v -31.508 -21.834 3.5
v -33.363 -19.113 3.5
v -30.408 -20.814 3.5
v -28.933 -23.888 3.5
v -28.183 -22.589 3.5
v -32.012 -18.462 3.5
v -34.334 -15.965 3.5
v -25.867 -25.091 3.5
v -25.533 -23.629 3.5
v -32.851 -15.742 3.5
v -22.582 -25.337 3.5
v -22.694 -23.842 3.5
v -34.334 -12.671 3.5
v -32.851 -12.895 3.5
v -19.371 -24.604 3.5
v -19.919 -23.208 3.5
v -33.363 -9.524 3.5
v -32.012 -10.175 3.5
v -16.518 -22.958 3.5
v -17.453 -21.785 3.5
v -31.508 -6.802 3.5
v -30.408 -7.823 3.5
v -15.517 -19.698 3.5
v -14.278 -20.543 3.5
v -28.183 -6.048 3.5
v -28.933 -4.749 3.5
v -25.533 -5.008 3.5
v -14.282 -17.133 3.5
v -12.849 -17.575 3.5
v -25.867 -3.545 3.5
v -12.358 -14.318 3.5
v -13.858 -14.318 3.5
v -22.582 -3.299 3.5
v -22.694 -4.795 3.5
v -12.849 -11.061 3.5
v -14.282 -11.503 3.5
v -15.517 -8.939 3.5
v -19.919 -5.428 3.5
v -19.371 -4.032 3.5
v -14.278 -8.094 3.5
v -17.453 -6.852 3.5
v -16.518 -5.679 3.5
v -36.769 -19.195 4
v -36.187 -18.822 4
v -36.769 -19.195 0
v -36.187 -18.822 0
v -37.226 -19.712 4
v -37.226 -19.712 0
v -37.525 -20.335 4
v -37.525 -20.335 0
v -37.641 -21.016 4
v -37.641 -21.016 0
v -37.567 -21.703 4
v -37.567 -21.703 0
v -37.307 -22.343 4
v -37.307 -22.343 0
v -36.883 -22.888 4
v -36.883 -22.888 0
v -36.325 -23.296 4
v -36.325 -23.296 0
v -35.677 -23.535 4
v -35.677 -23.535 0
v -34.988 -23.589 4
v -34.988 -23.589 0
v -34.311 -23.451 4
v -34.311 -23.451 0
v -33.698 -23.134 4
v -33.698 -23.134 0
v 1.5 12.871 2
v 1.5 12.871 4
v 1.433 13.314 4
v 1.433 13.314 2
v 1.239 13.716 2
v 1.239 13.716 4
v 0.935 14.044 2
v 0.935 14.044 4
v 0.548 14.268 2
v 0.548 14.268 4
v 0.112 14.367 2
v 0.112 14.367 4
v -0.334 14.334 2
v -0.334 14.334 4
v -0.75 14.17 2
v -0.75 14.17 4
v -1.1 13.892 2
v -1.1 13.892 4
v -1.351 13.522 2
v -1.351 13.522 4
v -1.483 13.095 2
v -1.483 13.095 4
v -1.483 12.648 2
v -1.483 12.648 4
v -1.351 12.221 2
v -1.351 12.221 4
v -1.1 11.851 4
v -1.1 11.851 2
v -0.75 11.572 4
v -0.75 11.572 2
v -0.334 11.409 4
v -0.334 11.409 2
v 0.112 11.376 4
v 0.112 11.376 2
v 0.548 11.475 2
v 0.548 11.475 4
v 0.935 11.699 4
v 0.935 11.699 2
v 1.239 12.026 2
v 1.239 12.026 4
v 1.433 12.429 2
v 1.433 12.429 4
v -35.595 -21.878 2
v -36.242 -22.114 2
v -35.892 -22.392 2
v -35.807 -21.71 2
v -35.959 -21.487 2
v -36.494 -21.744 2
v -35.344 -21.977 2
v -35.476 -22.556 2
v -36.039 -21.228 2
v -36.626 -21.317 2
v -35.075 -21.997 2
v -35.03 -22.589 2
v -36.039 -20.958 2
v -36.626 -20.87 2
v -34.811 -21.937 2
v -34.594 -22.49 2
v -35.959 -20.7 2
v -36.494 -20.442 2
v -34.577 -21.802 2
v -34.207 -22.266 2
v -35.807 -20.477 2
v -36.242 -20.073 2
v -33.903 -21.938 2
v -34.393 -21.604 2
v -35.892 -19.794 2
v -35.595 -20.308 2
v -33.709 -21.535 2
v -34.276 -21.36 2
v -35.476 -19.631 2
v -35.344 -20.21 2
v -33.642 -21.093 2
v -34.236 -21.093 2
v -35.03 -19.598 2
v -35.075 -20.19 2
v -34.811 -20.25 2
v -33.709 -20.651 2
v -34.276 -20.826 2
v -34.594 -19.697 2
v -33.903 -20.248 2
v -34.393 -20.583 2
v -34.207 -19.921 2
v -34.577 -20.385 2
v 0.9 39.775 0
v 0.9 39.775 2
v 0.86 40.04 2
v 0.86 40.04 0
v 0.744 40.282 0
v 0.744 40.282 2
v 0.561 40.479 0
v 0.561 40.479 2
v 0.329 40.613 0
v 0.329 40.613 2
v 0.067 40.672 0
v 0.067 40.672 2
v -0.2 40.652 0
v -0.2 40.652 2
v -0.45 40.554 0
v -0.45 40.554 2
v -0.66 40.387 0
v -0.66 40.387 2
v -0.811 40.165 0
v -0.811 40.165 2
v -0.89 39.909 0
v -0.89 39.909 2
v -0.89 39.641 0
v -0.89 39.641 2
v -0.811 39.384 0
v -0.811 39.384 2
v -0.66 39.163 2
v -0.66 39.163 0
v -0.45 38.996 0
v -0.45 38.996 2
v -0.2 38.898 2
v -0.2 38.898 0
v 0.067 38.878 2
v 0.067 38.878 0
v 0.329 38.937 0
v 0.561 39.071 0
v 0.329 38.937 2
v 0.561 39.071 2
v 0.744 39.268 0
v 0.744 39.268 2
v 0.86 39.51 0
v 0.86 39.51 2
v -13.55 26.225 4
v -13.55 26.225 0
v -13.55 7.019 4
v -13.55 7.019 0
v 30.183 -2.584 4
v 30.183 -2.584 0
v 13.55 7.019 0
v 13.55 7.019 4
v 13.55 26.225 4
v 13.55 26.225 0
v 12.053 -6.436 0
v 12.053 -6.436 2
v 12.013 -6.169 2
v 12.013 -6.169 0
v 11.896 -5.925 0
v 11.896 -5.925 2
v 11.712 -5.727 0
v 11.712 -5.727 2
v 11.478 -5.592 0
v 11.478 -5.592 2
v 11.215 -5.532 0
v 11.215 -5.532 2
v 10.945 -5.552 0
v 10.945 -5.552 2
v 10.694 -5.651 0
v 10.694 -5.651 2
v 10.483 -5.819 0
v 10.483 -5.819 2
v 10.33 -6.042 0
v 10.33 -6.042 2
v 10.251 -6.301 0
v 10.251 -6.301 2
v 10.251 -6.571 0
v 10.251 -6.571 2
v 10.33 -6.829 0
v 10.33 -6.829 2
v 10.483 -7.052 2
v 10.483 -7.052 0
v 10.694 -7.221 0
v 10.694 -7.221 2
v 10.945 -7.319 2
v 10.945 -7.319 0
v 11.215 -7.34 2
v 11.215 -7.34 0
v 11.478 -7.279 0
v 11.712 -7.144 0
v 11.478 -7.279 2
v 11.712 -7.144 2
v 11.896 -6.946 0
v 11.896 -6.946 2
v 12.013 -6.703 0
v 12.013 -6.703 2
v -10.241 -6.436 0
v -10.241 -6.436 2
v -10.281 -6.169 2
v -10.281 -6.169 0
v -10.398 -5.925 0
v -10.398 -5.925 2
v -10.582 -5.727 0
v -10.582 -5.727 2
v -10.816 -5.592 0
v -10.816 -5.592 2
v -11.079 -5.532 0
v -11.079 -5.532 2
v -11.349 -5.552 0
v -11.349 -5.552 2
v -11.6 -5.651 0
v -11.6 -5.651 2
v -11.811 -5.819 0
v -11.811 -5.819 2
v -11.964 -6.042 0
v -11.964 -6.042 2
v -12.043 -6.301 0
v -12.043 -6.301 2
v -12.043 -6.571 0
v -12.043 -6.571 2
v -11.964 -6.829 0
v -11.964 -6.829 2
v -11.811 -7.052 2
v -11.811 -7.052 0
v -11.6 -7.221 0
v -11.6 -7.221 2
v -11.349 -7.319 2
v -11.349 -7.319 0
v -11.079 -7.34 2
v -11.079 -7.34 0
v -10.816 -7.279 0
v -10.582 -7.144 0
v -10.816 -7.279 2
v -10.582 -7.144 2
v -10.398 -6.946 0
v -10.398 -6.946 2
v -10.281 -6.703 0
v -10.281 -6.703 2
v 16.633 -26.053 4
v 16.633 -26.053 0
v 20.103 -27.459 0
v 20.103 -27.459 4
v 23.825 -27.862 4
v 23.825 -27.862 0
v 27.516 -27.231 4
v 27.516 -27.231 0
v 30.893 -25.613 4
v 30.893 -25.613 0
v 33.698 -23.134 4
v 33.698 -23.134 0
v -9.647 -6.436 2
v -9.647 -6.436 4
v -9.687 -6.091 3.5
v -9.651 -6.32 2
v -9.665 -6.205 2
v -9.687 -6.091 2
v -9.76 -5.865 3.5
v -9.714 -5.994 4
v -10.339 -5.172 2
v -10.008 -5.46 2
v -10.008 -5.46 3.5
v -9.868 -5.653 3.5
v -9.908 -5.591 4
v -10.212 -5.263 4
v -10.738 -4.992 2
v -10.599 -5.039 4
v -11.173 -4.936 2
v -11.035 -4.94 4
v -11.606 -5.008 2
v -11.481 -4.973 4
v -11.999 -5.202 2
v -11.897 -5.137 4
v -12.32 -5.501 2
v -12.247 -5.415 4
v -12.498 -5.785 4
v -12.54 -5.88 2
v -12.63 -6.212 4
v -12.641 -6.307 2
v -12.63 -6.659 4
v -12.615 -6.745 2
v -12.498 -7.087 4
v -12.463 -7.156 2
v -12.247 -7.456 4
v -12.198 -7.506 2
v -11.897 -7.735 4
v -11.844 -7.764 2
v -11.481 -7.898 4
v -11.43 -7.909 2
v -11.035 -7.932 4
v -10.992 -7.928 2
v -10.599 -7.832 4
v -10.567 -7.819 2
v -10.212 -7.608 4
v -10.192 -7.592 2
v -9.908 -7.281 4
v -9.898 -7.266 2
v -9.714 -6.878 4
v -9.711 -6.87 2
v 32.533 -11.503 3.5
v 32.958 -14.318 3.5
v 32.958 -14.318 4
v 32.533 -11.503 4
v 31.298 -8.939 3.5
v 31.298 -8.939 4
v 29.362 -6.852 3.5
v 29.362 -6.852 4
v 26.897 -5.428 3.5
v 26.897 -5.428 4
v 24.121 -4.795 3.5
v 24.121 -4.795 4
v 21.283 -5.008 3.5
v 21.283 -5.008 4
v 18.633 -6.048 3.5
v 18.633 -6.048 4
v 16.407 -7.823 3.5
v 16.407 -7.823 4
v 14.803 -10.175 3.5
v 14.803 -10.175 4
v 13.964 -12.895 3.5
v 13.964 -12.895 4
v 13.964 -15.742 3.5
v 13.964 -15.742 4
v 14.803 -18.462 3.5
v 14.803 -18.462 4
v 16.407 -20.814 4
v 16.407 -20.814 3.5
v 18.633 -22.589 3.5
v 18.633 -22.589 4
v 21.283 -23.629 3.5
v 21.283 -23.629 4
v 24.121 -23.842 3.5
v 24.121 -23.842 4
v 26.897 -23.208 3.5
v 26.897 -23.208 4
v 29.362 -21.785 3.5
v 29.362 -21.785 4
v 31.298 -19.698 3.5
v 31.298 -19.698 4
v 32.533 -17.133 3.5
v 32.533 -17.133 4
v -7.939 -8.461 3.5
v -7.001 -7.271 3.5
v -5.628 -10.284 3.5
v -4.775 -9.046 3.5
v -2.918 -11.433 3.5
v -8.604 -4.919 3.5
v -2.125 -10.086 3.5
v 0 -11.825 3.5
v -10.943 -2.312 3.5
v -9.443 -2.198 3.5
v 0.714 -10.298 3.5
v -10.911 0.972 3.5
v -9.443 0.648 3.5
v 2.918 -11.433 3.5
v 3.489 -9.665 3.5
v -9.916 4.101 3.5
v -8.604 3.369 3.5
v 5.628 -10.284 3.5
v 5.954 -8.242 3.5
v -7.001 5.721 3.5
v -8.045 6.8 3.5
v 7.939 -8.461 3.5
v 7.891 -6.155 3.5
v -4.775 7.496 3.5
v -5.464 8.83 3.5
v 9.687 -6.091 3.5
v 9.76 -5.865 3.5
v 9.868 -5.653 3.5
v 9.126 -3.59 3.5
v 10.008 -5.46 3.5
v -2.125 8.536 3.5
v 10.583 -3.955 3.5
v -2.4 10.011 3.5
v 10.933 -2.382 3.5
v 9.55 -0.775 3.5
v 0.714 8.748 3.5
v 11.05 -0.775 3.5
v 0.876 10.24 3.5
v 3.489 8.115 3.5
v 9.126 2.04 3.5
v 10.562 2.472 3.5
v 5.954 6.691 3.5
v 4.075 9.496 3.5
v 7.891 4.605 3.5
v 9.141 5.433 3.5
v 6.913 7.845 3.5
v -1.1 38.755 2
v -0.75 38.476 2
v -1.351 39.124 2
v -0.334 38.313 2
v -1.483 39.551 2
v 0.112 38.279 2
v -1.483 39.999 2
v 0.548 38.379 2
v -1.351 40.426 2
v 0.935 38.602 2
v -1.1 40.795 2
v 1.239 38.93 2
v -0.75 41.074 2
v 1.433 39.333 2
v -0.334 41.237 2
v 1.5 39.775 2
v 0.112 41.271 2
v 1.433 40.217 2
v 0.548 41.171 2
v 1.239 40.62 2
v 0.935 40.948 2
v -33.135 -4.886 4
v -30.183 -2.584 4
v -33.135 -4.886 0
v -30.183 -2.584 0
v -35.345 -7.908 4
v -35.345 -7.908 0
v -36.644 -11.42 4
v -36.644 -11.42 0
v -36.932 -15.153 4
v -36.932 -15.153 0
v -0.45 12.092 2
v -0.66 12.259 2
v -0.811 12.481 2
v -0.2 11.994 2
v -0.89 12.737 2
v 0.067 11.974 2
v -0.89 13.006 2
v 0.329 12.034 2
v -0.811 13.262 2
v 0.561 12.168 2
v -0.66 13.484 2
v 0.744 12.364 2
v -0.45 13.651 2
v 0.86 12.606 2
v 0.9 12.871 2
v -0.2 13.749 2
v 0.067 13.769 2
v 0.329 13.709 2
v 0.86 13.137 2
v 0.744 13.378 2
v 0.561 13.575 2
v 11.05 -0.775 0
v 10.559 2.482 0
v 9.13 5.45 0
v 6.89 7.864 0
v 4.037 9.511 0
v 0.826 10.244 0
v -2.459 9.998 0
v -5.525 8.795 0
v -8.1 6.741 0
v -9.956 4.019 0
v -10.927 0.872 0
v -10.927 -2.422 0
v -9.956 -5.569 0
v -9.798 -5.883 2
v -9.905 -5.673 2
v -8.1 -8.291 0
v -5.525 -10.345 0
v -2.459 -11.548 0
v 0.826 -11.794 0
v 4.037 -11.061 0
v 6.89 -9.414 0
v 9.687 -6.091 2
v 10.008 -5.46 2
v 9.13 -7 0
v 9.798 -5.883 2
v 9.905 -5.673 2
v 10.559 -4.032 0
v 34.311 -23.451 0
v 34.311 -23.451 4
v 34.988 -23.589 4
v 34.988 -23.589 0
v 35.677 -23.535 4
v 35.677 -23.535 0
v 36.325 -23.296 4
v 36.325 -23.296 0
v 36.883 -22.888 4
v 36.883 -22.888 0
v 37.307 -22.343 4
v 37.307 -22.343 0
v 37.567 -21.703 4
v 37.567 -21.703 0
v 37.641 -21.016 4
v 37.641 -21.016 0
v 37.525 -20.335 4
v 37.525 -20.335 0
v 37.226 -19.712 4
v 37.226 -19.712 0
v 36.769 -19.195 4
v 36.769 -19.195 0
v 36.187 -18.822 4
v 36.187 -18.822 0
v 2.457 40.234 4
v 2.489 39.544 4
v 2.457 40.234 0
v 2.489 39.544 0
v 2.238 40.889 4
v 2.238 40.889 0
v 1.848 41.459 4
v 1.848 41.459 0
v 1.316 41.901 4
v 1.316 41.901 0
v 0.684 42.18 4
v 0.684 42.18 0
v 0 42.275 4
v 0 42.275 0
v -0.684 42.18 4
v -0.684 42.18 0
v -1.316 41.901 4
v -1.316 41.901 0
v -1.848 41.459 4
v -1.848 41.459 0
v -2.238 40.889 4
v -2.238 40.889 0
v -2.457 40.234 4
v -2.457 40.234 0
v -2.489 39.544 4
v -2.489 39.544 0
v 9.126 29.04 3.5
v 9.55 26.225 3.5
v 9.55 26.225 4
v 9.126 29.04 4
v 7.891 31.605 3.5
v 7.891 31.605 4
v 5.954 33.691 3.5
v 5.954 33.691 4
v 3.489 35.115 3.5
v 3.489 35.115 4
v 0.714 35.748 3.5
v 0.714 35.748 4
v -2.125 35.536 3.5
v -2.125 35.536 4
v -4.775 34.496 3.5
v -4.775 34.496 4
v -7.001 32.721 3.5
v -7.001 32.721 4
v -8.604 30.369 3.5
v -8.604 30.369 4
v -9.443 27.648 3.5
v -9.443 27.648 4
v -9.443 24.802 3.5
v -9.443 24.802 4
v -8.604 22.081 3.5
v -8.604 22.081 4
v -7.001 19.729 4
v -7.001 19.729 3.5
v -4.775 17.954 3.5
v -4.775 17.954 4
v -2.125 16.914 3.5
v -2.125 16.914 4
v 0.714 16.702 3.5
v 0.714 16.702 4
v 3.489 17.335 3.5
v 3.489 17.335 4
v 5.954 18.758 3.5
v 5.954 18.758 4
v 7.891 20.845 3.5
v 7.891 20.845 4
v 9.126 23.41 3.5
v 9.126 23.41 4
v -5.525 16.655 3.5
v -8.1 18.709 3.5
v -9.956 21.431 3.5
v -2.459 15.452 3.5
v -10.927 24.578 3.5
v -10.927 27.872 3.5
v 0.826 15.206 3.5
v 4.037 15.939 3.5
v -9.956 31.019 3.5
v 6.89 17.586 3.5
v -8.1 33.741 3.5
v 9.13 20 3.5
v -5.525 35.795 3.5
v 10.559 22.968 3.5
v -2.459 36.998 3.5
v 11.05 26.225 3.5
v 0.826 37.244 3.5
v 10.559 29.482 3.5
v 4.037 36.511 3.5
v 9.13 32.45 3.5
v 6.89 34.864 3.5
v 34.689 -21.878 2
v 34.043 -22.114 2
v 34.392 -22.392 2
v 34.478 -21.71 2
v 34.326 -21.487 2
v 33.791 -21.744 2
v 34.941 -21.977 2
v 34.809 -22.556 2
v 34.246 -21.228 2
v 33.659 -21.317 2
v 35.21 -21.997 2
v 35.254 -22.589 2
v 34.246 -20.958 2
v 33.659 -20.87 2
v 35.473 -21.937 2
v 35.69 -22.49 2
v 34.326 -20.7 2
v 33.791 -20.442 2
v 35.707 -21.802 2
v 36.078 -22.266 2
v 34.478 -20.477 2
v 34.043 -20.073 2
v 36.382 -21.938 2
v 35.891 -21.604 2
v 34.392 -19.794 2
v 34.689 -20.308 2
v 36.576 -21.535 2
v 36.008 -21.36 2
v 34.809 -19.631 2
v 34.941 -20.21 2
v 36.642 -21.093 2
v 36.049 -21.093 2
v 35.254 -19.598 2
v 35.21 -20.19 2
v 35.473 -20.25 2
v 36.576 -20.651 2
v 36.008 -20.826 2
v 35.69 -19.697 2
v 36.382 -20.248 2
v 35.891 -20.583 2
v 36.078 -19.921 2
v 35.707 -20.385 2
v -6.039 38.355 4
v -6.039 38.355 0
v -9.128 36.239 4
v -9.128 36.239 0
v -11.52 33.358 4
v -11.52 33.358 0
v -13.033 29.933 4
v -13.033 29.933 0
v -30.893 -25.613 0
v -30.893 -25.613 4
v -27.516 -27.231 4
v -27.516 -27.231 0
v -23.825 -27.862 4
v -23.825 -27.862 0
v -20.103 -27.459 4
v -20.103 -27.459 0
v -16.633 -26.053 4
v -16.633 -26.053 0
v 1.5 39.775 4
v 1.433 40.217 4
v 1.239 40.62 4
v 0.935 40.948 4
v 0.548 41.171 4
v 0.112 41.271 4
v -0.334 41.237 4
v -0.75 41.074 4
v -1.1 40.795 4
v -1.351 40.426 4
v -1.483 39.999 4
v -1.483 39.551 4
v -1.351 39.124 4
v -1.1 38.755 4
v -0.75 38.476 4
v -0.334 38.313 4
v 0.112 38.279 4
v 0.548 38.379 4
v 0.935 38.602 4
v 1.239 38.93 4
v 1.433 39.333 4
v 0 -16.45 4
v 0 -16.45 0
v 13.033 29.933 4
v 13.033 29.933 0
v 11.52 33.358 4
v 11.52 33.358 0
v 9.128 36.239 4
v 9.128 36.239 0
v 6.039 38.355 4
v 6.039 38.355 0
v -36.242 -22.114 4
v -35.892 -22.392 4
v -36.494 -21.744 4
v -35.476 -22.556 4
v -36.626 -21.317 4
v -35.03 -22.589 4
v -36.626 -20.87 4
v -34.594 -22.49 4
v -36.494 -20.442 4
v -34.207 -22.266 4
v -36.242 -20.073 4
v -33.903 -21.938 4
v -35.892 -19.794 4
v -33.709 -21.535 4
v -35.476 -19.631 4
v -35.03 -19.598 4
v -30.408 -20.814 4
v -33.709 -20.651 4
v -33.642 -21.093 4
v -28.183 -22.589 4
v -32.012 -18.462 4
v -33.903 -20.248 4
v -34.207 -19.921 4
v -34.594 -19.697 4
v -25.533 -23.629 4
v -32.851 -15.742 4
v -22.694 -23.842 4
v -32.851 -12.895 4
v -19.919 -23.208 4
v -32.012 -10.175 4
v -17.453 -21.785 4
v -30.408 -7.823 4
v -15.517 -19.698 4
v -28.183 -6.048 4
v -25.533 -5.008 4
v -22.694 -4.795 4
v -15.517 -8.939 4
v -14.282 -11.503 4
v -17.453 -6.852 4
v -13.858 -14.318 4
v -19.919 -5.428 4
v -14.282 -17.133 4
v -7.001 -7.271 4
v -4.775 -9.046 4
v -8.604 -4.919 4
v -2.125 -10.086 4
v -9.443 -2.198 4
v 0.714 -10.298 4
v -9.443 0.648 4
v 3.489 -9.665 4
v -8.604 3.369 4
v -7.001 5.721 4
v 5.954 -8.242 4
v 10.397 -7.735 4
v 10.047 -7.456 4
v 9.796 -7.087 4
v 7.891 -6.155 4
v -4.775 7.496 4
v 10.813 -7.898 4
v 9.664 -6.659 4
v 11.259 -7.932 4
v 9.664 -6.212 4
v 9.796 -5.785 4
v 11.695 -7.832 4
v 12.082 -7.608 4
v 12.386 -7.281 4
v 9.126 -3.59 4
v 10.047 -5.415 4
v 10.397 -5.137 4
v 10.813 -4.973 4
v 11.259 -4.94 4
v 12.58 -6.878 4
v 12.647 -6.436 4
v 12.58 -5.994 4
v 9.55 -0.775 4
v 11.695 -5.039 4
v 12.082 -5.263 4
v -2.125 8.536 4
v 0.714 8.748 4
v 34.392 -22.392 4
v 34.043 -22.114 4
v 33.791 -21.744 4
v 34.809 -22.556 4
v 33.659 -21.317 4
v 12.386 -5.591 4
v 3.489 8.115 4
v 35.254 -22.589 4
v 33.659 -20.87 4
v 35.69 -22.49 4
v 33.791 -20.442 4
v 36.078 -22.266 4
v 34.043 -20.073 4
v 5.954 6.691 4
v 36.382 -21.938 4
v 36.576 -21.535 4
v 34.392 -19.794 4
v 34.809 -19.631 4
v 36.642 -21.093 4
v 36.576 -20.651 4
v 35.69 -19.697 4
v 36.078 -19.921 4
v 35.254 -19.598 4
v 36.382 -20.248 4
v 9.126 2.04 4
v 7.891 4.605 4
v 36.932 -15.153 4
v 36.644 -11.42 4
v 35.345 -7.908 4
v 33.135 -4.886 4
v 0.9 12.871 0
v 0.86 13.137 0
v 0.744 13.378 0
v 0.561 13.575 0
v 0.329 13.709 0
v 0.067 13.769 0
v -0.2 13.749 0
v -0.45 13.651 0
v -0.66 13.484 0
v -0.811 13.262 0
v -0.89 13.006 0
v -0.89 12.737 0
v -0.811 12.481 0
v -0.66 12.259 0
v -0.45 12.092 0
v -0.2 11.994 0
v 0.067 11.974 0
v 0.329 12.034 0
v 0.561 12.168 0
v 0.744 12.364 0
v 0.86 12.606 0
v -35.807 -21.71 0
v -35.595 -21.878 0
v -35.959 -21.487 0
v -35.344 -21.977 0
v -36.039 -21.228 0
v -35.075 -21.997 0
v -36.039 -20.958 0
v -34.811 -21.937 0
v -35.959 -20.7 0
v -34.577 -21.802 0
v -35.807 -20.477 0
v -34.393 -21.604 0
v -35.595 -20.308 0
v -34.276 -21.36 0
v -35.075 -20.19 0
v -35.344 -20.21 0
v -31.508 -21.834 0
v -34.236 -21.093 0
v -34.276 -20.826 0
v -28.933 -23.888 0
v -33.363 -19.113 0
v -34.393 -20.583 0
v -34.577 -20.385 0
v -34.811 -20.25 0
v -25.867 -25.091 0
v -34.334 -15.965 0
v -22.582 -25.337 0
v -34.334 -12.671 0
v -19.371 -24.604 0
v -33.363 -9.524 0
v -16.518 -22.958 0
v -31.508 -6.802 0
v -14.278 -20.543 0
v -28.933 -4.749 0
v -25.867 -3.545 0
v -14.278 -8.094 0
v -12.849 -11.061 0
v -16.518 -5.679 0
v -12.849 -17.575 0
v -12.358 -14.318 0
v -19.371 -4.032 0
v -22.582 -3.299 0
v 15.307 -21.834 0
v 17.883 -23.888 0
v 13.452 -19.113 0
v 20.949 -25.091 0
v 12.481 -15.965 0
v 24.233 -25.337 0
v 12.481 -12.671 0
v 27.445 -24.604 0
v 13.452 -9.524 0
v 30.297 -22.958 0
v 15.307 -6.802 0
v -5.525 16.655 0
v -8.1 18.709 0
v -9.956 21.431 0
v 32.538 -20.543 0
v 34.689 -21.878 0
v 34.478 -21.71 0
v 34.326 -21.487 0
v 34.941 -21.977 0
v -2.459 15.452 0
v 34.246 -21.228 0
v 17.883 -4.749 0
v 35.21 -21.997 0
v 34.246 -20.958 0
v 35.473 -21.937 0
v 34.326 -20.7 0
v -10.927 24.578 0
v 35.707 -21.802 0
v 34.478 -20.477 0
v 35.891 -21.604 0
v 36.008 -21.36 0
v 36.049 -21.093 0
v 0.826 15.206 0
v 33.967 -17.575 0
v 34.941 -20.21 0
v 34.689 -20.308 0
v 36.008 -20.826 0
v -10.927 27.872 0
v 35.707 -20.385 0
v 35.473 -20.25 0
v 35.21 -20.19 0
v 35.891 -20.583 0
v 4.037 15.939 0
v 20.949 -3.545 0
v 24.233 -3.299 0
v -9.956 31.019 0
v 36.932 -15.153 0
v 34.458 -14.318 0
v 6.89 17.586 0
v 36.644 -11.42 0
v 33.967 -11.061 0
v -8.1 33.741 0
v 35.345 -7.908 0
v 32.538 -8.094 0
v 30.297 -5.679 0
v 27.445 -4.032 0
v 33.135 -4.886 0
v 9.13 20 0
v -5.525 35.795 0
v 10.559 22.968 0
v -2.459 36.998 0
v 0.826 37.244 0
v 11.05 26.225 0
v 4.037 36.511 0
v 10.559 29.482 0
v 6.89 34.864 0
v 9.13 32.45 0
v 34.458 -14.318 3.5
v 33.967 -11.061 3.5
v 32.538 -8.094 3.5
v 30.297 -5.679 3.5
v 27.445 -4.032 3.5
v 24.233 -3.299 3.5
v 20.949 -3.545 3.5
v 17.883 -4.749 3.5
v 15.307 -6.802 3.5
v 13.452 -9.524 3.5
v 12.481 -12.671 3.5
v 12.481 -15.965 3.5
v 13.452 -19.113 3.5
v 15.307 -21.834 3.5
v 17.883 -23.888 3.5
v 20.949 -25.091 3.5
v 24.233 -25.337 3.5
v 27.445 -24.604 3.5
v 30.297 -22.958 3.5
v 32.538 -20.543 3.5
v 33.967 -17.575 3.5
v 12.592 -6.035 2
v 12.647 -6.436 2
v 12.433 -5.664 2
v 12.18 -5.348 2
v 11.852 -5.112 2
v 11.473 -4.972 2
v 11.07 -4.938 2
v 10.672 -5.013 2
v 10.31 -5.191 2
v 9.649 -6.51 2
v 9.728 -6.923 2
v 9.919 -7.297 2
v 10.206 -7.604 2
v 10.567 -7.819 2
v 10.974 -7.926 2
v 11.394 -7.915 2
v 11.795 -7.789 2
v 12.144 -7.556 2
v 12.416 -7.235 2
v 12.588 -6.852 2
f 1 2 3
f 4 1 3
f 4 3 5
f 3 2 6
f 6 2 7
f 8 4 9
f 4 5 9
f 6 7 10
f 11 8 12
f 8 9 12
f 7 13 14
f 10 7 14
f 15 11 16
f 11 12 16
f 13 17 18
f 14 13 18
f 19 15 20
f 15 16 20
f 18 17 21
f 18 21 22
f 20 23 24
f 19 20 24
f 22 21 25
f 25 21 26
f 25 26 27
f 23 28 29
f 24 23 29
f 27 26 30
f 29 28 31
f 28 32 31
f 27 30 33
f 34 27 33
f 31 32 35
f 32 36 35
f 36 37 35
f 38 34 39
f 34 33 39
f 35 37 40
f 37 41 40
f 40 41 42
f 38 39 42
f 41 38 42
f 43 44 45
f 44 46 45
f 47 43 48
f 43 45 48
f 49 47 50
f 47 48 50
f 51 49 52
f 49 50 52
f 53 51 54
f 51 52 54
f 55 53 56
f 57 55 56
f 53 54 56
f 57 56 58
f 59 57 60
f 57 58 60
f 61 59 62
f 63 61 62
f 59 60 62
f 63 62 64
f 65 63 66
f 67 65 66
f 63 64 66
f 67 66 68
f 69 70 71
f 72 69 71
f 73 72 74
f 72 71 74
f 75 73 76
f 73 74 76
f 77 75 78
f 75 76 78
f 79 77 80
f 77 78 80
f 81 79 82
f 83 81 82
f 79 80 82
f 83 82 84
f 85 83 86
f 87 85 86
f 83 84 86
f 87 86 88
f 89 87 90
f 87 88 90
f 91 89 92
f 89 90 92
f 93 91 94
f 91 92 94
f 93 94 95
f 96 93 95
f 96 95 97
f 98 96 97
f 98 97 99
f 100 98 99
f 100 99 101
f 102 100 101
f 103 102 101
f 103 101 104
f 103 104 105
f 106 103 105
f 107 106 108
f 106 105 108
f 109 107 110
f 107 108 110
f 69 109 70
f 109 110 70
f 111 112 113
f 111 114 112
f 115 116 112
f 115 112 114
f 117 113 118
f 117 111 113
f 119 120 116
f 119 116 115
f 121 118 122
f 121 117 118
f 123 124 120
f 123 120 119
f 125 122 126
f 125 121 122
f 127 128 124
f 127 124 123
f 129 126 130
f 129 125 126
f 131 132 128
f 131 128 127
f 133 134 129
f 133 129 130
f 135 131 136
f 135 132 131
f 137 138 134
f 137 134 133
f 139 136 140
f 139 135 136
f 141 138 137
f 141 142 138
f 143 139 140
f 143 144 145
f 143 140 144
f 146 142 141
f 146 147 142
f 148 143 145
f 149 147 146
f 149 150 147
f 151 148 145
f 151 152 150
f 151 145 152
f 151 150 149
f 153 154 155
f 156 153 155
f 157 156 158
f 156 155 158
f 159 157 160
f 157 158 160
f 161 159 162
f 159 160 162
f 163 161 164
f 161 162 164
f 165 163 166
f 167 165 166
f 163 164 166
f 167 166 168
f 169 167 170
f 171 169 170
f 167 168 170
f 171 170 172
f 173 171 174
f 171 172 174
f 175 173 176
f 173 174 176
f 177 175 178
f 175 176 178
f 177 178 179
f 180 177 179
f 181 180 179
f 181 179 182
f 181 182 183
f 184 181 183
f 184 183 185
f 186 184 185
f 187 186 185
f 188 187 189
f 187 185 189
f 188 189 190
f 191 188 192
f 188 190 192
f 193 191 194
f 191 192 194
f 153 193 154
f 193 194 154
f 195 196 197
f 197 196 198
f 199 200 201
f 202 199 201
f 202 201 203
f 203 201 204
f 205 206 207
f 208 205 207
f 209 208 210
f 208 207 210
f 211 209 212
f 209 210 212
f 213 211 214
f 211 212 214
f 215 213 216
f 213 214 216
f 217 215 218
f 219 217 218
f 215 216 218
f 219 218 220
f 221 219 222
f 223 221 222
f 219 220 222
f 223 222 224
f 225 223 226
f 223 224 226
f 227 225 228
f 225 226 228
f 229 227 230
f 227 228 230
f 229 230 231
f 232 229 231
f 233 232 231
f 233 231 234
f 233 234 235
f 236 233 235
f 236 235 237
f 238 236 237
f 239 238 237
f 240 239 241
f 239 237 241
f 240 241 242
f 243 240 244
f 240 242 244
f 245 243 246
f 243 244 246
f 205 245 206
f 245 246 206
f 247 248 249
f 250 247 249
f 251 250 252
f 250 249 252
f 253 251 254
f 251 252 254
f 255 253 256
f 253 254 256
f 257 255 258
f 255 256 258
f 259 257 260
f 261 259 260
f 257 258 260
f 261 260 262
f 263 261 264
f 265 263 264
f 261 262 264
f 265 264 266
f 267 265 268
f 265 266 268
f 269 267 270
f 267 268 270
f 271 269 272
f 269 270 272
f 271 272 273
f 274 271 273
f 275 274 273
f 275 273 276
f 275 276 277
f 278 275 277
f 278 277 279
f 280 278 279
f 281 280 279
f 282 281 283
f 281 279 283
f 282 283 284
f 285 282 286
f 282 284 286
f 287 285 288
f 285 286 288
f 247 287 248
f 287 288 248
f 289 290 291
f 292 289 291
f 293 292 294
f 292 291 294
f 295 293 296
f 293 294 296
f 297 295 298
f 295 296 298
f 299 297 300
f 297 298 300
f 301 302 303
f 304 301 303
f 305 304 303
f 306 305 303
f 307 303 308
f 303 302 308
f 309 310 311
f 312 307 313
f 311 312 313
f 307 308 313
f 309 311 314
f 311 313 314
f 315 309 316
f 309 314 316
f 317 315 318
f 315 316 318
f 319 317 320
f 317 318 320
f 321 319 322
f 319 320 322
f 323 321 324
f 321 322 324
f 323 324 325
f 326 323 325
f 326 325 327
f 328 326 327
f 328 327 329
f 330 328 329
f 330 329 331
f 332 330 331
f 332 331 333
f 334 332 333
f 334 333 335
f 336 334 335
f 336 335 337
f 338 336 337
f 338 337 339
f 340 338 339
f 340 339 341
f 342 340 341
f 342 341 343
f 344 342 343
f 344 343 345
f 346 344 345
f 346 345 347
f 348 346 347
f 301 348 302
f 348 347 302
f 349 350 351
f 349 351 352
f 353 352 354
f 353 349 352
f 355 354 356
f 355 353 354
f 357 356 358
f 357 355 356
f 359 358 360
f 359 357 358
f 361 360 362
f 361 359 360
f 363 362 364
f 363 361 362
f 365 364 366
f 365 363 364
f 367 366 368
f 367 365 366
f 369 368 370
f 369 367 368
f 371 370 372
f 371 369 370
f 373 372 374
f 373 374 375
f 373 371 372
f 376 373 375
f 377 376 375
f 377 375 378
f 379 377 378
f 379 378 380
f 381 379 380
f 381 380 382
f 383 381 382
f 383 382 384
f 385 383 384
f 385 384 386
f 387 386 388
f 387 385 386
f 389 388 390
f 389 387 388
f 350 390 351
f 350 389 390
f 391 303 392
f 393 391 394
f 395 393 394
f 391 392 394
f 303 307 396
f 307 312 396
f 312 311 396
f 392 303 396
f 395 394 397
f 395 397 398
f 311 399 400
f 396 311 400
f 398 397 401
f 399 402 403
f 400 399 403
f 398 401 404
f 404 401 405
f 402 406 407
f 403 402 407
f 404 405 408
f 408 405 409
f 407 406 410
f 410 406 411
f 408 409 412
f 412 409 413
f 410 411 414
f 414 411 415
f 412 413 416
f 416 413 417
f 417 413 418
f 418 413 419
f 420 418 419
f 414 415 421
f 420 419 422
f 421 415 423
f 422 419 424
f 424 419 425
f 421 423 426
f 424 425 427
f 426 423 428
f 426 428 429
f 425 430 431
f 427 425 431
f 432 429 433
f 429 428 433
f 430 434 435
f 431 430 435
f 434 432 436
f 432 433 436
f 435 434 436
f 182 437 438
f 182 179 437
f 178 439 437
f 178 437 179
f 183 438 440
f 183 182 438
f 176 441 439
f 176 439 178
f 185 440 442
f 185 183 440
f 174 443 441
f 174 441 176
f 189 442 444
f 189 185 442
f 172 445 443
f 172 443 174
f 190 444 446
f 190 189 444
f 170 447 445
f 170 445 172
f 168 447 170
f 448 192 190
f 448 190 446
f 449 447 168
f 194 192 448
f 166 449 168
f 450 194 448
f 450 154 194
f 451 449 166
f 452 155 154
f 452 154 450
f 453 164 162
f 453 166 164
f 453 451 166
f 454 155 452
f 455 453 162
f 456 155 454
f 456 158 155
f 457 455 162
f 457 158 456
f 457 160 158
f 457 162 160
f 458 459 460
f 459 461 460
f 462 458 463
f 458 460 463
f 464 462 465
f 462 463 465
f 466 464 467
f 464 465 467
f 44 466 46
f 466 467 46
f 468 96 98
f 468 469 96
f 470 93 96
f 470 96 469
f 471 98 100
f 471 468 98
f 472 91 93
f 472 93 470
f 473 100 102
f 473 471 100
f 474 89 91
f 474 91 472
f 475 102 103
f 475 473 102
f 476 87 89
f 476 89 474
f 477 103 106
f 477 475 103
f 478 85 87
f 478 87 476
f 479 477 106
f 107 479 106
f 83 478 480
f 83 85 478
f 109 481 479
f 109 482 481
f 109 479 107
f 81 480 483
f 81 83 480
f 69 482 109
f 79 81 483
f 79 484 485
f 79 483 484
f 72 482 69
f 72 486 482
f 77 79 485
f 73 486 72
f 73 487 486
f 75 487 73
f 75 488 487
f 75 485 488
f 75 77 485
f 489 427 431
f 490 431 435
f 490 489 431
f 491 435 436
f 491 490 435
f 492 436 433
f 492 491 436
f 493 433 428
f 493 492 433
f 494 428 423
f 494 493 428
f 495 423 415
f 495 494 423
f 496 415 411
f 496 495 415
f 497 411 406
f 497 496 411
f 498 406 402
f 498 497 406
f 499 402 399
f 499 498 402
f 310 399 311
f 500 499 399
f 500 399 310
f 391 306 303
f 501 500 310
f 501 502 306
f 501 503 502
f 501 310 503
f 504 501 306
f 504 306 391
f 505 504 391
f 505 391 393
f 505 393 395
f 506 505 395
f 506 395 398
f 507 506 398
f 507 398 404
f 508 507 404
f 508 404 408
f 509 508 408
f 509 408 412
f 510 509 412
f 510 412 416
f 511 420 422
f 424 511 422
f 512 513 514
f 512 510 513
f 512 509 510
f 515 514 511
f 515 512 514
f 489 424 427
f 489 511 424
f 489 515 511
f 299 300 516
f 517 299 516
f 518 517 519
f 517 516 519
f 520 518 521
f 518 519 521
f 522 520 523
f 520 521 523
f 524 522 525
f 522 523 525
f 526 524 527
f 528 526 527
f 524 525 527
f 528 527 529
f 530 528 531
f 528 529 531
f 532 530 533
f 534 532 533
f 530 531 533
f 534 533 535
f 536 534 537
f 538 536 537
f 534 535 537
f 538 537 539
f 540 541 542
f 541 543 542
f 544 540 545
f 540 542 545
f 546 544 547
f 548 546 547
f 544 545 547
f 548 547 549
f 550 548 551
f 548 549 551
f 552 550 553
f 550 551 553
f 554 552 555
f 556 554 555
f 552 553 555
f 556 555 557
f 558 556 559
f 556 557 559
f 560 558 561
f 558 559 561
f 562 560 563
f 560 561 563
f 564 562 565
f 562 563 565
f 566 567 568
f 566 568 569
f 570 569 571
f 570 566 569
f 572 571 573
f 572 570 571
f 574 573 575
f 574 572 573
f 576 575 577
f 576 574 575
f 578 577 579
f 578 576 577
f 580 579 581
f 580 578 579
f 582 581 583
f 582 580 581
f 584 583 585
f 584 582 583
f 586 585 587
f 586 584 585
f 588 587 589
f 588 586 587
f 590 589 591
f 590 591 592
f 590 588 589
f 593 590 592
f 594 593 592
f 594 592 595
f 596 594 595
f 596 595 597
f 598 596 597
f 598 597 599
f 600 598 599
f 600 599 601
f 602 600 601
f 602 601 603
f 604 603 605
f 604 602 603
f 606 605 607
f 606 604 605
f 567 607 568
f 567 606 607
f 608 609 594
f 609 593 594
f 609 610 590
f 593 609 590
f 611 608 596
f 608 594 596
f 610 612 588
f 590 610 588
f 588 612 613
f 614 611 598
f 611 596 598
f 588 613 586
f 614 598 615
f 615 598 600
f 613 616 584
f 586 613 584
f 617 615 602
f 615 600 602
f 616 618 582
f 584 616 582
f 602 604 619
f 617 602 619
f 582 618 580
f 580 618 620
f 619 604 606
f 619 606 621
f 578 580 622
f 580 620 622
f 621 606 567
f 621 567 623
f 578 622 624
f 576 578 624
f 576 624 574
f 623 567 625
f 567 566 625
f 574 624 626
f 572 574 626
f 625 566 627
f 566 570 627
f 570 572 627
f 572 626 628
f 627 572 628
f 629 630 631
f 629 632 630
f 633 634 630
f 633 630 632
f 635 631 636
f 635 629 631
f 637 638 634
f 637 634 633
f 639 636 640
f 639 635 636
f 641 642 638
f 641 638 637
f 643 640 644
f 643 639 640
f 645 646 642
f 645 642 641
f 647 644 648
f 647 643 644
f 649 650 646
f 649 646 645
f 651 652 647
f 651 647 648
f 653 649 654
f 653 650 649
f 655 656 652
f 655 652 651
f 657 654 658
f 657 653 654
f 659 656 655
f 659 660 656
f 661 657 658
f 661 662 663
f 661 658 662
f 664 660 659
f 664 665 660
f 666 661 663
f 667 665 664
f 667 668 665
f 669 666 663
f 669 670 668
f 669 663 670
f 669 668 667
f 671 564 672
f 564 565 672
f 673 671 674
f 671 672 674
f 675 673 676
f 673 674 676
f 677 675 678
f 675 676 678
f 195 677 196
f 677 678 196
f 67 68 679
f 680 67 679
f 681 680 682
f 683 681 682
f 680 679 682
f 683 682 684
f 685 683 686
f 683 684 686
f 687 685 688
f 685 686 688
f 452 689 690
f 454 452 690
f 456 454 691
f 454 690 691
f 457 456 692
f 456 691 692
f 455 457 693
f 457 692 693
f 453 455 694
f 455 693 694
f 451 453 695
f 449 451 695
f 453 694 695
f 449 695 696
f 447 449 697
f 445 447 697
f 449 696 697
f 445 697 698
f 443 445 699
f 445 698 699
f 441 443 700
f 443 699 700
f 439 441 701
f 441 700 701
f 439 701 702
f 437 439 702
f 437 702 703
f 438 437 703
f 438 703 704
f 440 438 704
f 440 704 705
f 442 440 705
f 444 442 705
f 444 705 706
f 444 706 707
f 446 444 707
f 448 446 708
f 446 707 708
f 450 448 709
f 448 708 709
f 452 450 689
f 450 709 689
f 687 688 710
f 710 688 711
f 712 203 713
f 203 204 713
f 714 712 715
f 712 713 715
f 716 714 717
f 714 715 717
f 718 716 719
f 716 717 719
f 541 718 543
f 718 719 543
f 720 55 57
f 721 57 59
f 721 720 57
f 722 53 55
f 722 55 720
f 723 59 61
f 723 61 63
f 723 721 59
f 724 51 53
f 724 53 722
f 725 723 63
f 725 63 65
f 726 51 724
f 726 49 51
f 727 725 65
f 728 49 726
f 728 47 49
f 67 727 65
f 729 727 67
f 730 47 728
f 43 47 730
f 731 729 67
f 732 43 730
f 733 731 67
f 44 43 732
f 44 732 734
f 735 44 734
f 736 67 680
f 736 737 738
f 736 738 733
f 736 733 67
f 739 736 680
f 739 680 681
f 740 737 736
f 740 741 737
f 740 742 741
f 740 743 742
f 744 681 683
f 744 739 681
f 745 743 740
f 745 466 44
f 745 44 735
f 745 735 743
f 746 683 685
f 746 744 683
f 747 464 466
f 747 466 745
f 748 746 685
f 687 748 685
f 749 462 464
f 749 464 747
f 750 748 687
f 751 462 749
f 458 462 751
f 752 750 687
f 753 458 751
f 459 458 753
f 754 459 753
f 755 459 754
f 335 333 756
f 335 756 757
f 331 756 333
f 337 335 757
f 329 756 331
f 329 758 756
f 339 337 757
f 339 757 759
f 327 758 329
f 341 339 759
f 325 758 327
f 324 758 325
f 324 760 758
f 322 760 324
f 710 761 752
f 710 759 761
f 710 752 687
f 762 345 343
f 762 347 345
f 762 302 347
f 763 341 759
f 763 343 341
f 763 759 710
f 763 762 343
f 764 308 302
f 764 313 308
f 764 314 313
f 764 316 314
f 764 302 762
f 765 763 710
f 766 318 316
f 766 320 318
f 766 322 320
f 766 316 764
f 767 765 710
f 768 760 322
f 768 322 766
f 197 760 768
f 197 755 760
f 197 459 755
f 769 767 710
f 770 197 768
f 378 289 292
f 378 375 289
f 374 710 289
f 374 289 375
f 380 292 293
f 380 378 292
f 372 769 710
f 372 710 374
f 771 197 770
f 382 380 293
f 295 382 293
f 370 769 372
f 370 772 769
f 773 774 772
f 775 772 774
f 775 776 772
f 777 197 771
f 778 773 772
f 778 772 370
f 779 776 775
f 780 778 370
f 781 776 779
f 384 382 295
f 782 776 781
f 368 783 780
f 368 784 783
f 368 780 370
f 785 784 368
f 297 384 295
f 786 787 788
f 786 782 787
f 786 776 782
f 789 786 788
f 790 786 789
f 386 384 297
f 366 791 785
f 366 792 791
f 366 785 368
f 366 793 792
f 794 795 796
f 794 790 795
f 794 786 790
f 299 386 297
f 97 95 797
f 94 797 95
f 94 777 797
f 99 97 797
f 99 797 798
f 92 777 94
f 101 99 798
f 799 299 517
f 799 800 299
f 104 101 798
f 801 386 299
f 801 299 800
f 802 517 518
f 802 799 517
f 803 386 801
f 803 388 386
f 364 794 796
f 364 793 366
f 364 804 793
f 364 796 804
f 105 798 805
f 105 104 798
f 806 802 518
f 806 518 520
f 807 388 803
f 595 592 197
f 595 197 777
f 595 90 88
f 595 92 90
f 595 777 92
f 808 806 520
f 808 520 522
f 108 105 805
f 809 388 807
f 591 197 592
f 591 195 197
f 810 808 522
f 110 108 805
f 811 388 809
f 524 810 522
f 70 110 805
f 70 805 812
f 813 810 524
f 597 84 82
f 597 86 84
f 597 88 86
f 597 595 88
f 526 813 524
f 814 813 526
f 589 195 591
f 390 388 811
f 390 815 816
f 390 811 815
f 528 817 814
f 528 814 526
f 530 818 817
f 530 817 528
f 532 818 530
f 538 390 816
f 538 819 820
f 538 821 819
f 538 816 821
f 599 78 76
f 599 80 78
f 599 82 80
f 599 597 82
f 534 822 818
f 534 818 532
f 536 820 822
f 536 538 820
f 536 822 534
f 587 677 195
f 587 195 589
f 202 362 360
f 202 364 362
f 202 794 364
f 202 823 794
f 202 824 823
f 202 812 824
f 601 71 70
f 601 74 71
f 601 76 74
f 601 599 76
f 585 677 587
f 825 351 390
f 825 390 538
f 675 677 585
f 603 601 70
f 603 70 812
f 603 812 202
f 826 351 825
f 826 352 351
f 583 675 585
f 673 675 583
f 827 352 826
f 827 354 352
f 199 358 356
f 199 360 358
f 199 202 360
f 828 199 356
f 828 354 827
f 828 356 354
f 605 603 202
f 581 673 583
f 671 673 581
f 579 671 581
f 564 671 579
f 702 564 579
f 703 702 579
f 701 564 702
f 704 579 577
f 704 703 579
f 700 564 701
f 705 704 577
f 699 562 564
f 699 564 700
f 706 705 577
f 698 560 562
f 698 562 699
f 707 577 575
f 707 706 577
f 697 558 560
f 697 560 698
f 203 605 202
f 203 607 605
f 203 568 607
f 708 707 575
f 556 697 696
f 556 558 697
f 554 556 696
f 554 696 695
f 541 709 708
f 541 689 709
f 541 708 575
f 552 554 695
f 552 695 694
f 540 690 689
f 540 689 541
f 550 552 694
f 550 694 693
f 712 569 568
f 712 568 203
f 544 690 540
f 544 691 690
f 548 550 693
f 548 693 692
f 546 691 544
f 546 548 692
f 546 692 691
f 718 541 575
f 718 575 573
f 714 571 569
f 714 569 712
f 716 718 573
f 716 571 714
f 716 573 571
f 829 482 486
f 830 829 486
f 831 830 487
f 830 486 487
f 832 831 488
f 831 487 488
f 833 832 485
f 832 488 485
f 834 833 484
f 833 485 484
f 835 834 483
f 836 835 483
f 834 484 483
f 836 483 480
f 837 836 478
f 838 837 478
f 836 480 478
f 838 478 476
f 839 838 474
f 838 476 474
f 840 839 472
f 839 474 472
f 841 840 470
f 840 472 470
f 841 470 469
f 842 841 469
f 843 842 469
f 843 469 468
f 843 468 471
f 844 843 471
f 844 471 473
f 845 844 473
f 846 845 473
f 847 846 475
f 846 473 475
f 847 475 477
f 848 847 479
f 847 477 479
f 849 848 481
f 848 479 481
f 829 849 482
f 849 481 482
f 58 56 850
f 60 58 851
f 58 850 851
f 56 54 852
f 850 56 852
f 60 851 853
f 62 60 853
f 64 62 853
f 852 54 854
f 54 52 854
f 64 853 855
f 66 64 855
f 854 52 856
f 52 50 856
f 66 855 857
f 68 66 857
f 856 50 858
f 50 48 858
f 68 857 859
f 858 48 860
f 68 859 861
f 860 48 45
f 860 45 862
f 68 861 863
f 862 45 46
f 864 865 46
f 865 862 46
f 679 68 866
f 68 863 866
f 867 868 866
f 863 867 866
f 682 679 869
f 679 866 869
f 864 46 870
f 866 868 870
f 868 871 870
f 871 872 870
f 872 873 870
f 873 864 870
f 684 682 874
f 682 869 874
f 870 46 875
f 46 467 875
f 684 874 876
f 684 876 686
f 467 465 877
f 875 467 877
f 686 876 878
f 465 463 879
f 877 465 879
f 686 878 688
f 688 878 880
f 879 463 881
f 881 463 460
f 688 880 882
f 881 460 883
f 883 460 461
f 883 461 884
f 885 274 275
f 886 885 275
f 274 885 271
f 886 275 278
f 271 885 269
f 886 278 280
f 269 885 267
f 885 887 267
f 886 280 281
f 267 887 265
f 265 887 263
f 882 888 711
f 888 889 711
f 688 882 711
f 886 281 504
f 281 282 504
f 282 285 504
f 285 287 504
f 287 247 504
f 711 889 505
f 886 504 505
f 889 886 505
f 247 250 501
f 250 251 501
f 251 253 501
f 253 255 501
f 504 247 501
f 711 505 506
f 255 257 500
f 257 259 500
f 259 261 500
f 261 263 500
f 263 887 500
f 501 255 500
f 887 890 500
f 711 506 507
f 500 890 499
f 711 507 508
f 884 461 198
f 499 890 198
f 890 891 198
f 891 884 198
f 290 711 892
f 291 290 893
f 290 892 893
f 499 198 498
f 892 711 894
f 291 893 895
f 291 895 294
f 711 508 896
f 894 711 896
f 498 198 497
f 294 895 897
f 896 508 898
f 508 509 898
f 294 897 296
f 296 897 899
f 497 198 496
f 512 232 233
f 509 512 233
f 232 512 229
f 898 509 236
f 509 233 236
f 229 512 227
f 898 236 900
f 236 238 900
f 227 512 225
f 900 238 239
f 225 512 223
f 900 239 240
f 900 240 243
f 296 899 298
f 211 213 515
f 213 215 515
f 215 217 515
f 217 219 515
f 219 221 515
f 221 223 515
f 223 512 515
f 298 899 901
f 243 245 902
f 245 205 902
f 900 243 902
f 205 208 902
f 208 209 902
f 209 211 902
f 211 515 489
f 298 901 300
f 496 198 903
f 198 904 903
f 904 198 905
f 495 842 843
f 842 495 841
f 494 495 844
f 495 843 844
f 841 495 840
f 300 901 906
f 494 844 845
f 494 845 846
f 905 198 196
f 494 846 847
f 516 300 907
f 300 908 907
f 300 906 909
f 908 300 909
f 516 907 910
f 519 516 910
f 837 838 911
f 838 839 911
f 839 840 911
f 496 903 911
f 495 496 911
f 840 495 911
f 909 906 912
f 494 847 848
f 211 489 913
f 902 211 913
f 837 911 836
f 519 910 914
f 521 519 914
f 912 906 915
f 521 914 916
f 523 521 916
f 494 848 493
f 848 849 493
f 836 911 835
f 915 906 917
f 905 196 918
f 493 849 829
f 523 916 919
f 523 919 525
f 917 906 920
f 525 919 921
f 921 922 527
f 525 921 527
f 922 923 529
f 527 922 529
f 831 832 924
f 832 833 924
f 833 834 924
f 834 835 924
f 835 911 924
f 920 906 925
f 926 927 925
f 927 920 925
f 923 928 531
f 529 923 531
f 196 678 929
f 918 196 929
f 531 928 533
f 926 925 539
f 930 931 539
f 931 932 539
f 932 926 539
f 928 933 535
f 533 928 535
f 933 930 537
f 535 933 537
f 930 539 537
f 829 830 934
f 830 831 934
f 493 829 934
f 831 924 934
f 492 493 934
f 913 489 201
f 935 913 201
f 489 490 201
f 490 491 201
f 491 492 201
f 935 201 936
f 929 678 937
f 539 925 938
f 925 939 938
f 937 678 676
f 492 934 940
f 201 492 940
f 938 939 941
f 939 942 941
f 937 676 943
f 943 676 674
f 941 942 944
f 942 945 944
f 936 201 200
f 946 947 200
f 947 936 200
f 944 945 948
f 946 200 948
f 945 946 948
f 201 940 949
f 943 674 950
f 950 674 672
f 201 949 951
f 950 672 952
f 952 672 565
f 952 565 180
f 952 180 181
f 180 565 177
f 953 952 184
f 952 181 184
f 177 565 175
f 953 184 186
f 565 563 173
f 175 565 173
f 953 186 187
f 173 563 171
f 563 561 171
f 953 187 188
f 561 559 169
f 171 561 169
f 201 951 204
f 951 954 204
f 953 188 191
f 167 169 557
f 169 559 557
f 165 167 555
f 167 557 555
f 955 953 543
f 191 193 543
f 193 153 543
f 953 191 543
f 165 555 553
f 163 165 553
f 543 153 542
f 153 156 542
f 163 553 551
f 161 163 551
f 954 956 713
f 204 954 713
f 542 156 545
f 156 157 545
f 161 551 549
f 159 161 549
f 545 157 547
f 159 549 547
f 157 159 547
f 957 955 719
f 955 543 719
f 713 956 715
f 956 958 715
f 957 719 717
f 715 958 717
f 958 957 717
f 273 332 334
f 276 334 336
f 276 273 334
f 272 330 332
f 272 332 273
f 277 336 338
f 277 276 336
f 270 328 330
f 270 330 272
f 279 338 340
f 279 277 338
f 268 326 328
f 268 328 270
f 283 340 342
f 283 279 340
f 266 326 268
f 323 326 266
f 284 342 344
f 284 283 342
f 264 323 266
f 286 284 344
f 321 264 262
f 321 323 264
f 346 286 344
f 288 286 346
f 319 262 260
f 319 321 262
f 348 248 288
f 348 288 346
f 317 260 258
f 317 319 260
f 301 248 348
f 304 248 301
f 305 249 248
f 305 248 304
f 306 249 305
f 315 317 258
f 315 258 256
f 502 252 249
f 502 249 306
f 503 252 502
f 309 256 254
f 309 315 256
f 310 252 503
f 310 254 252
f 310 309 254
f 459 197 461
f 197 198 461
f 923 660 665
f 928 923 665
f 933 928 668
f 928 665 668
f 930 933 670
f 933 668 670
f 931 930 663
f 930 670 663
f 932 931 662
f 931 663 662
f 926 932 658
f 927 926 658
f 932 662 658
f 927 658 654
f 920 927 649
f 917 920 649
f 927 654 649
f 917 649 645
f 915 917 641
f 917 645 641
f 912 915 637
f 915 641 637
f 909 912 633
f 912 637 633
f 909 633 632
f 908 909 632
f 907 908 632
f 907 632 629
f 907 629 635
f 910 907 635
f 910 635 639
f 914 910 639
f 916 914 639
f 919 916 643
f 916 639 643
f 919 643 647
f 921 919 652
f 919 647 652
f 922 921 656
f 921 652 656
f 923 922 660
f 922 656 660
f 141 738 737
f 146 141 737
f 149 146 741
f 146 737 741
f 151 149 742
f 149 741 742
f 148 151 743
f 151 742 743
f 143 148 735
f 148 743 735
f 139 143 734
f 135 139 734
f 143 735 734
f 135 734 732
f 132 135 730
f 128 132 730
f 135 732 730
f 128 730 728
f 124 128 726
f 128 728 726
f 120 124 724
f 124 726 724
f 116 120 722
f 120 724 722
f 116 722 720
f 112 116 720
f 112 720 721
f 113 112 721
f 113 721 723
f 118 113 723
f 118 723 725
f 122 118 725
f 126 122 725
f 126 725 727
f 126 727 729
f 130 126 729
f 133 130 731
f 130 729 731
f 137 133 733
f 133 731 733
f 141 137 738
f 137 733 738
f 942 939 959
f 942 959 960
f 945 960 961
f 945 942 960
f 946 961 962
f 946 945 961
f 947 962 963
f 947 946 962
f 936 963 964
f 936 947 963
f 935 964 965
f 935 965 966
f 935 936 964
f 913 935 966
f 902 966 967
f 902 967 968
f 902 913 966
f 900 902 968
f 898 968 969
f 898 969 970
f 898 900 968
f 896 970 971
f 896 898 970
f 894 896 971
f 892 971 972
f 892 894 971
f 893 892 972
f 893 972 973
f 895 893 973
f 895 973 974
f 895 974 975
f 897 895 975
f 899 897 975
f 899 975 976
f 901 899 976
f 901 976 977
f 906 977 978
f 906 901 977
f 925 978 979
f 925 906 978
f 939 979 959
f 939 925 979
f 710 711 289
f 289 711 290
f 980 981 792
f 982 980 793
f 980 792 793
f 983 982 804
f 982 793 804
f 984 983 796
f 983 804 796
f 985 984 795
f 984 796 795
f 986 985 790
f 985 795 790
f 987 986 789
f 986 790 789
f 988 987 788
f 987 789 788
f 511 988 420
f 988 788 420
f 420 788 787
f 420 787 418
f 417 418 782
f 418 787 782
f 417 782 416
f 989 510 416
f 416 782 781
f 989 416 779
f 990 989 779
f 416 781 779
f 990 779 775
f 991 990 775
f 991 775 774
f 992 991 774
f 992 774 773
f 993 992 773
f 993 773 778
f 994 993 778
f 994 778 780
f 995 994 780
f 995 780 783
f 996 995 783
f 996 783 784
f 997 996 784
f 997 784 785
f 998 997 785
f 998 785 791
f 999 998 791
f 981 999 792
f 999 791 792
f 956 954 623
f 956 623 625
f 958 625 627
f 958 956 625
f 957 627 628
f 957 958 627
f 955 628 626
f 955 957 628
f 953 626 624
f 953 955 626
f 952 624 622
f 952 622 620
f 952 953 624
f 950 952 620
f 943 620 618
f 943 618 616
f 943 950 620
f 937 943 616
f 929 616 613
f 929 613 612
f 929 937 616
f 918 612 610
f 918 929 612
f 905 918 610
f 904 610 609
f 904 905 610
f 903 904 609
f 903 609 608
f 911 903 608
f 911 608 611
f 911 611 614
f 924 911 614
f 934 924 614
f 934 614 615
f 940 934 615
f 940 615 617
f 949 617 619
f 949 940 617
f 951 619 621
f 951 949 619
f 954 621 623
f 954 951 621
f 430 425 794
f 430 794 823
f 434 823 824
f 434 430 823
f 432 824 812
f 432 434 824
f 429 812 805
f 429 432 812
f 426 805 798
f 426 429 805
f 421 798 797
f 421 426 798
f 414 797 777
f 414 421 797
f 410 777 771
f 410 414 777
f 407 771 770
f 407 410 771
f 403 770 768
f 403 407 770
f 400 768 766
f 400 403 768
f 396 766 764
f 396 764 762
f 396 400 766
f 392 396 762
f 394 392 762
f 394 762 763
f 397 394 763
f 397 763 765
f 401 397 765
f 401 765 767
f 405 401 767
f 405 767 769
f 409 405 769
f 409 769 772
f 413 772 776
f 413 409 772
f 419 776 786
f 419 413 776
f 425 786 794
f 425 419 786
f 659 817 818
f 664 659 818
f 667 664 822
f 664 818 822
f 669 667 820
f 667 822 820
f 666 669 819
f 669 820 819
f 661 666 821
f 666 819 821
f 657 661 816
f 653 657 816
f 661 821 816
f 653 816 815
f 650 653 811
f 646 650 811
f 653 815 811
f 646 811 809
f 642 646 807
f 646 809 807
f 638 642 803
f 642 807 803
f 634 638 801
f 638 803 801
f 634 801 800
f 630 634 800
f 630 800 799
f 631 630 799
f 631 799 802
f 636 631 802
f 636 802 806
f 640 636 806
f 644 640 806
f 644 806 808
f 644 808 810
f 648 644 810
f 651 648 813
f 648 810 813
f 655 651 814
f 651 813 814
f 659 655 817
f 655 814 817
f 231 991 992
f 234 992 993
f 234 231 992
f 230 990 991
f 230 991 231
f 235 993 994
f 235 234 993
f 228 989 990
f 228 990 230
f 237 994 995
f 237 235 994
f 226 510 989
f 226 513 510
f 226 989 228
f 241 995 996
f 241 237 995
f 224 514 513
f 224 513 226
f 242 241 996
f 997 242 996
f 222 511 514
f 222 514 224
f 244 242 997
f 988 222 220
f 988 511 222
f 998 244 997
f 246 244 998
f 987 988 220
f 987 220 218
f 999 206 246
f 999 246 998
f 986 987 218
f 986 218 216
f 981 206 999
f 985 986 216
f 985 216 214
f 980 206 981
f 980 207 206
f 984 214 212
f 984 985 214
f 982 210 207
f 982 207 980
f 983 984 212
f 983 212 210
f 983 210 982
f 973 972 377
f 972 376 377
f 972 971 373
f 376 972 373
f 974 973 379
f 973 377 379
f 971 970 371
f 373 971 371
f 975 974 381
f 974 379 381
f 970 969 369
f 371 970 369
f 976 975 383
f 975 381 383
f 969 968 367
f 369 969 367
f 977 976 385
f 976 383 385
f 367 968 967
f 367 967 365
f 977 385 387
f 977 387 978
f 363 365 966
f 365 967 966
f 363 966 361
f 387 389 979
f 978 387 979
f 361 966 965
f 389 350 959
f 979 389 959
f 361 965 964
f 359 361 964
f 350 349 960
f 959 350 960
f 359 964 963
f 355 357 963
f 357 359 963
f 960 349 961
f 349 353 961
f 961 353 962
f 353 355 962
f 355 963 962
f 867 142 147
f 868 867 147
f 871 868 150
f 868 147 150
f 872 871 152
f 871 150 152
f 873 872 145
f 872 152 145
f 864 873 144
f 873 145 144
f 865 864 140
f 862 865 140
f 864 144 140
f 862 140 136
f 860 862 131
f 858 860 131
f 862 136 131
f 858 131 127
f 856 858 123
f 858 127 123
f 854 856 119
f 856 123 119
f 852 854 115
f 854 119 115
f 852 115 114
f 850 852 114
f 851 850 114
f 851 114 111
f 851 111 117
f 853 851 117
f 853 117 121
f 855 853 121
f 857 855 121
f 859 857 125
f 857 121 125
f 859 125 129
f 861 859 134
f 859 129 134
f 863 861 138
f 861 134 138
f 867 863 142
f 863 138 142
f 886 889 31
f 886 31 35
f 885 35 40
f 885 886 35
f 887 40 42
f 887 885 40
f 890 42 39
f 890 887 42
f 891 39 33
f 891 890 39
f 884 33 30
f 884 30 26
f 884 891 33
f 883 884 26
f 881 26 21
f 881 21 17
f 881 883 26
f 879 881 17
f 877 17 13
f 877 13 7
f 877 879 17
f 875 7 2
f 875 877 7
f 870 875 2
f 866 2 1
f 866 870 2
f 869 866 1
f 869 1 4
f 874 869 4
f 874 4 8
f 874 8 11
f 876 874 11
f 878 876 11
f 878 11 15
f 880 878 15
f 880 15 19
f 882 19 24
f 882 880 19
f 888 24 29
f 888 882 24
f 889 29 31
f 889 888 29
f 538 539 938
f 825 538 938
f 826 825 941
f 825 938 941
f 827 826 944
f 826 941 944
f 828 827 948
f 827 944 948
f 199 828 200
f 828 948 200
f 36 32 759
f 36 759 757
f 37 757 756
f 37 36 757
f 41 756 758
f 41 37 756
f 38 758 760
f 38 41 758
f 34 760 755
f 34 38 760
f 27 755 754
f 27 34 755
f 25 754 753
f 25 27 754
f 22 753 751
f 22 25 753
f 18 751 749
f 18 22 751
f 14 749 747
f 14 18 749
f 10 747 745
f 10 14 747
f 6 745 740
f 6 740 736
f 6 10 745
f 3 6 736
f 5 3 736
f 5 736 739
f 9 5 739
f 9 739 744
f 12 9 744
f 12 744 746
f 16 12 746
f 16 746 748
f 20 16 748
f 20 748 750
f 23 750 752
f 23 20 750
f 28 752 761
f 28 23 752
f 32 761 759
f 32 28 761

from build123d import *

# Parameters (mm, degrees)
F0_R     = 11.05
F1_DEPTH = 3.5
F2_R     = 11.05
F2_R_2   = 9.55
F3_DEPTH = 0.5
F4_R     = 1.5
F5_DEPTH = 2
F6_R     = 0.9
F6_R_2   = 0.9063368872
F7_DEPTH = 2


with BuildPart() as f1:
    # F0 (on Top) → F1 (new body)
    with BuildSketch(Plane.XY):
        with BuildLine():
            ThreePointArc((-2.4893394798, 39.5443588099), (-10.4243237179, 34.8815428811), (-13.55, 26.2249861161))
            Line((-13.55, 26.2249861161), (-13.55, 7.0192147502))
            Line((-13.55, 7.0192147502), (-30.1826859022, -2.5836709328))
            ThreePointArc((-30.1826859022, -2.5836709328), (-36.1166458289, -9.6188643795), (-36.1872707573, -18.8221702728))
            ThreePointArc((-36.1872707573, -18.8221702728), (-35.1423301235, -21.093315154), (-33.6979312775, -23.133832729))
            ThreePointArc((-33.6979312775, -23.133832729), (-25.692322111, -27.6743226935), (-16.6326859022, -26.0529593753))
            Line((-16.6326859022, -26.0529593753), (0, -16.4500736924))
            Line((0, -16.4500736924), (16.6326859022, -26.0529593753))
            ThreePointArc((16.6326859022, -26.0529593753), (25.692322111, -27.6743226935), (33.6979312775, -23.133832729))
            ThreePointArc((33.6979312775, -23.133832729), (35.1423301235, -21.093315154), (36.1872707573, -18.8221702728))
            ThreePointArc((36.1872707573, -18.8221702728), (36.1166458289, -9.6188643795), (30.1826859022, -2.5836709328))
            Line((30.1826859022, -2.5836709328), (13.55, 7.0192147502))
            Line((13.55, 7.0192147502), (13.55, 26.2249861161))
            ThreePointArc((13.55, 26.2249861161), (10.4243237179, 34.8815428811), (2.4893394798, 39.5443588099))
            ThreePointArc((2.4893394798, 39.5443588099), (0, 39.7749861161), (-2.4893394798, 39.5443588099))
        make_face()
        with Locations((-23.4076859022, -14.318315154)):
            Circle(F0_R, mode=Mode.SUBTRACT)
        with Locations((0, -0.7750138839)):
            Circle(F0_R, mode=Mode.SUBTRACT)
        with Locations((23.4076859022, -14.318315154)):
            Circle(F0_R, mode=Mode.SUBTRACT)
        with Locations((0, 26.2249861161)):
            Circle(F0_R, mode=Mode.SUBTRACT)
        with BuildLine():
            ThreePointArc((2.4893394798, 39.5443588099), (0, 42.2749861161), (-2.4893394798, 39.5443588099))
            ThreePointArc((-2.4893394798, 39.5443588099), (0, 39.7749861161), (2.4893394798, 39.5443588099))
        make_face()
        with BuildLine():
            ThreePointArc((-33.6979312775, -23.133832729), (-35.1423301235, -21.093315154), (-36.1872707573, -18.8221702728))
            ThreePointArc((-36.1872707573, -18.8221702728), (-37.3073936329, -22.343315154), (-33.6979312775, -23.133832729))
        make_face()
        with BuildLine():
            ThreePointArc((33.6979312775, -23.133832729), (37.3073936329, -22.343315154), (36.1872707573, -18.8221702728))
            ThreePointArc((36.1872707573, -18.8221702728), (35.1423301235, -21.093315154), (33.6979312775, -23.133832729))
        make_face()
    extrude(amount=F1_DEPTH)

    # F2 (on face) → F3 (join)
    with BuildSketch(Plane.XY.offset(3.5)):
        with BuildLine():
            Line((13.55, 7.0192147502), (13.55, 26.2249861161))
            ThreePointArc((13.55, 26.2249861161), (10.4243237179, 34.8815428811), (2.4893394798, 39.5443588099))
            ThreePointArc((2.4893394798, 39.5443588099), (0, 42.2749861161), (-2.4893394798, 39.5443588099))
            ThreePointArc((-2.4893394798, 39.5443588099), (-10.4243237179, 34.8815428811), (-13.55, 26.2249861161))
            Line((-13.55, 26.2249861161), (-13.55, 7.0192147502))
            Line((-13.55, 7.0192147502), (-30.1826859022, -2.5836709328))
            ThreePointArc((-30.1826859022, -2.5836709328), (-36.1166458289, -9.6188643795), (-36.1872707573, -18.8221702728))
            ThreePointArc((-36.1872707573, -18.8221702728), (-37.3073936329, -22.343315154), (-33.6979312775, -23.133832729))
            ThreePointArc((-33.6979312775, -23.133832729), (-25.692322111, -27.6743226935), (-16.6326859022, -26.0529593753))
            Line((-16.6326859022, -26.0529593753), (0, -16.4500736924))
            Line((0, -16.4500736924), (16.6326859022, -26.0529593753))
            ThreePointArc((16.6326859022, -26.0529593753), (25.692322111, -27.6743226935), (33.6979312775, -23.133832729))
            ThreePointArc((33.6979312775, -23.133832729), (37.3073936329, -22.343315154), (36.1872707573, -18.8221702728))
            ThreePointArc((36.1872707573, -18.8221702728), (36.1166458289, -9.6188643795), (30.1826859022, -2.5836709328))
            Line((30.1826859022, -2.5836709328), (13.55, 7.0192147502))
        make_face()
        with Locations((-23.4076859022, -14.318315154)):
            Circle(F2_R, mode=Mode.SUBTRACT)
        with Locations((0, -0.7750138839)):
            Circle(F2_R, mode=Mode.SUBTRACT)
        with Locations((23.4076859022, -14.318315154)):
            Circle(F2_R, mode=Mode.SUBTRACT)
        with Locations((0, 26.2249861161)):
            Circle(F2_R, mode=Mode.SUBTRACT)
        with Locations((0, 26.2249861161)):
            Circle(F2_R)
        with Locations((0, 26.2249861161)):
            Circle(F2_R_2, mode=Mode.SUBTRACT)
        with Locations((0, -0.7750138839)):
            Circle(F2_R)
        with Locations((0, -0.7750138839)):
            Circle(F2_R_2, mode=Mode.SUBTRACT)
        with Locations((-23.4076859022, -14.318315154)):
            Circle(F2_R)
        with Locations((-23.4076859022, -14.318315154)):
            Circle(F2_R_2, mode=Mode.SUBTRACT)
        with Locations((23.4076859022, -14.318315154)):
            Circle(F2_R)
        with Locations((23.4076859022, -14.318315154)):
            Circle(F2_R_2, mode=Mode.SUBTRACT)
    extrude(amount=F3_DEPTH)

    # F4 (on face) → F5 (cut)
    with BuildSketch(Plane.XY.offset(4)):
        with Locations((0, 39.7749861161)):
            Circle(F4_R)
        with Locations((-35.1423301235, -21.093315154)):
            Circle(F4_R)
        with Locations((35.1423301235, -21.093315154)):
            Circle(F4_R)
        with Locations((0, 12.8714358434)):
            Circle(F4_R)
        with Locations((-11.1469904236, -6.4357179217)):
            Circle(F4_R)
        with Locations((11.1469904236, -6.4357179217)):
            Circle(F4_R)
    extrude(amount=-F5_DEPTH, mode=Mode.SUBTRACT)

    # F6 (on face) → F7 (cut, through all)
    with BuildSketch(Plane.XY.offset(2)):
        with Locations((0, 39.7749861161)):
            Circle(F6_R)
        with Locations((0, 12.8714358434)):
            Circle(F6_R)
        with Locations((-11.1469904236, -6.4357179217)):
            Circle(F6_R_2)
        with Locations((-35.1423301235, -21.093315154)):
            Circle(F6_R_2)
        with Locations((11.1469904236, -6.4357179217)):
            Circle(F6_R_2)
        with Locations((35.1423301235, -21.093315154)):
            Circle(F6_R_2)
    extrude(amount=-F7_DEPTH, mode=Mode.SUBTRACT)


solid = f1.part
